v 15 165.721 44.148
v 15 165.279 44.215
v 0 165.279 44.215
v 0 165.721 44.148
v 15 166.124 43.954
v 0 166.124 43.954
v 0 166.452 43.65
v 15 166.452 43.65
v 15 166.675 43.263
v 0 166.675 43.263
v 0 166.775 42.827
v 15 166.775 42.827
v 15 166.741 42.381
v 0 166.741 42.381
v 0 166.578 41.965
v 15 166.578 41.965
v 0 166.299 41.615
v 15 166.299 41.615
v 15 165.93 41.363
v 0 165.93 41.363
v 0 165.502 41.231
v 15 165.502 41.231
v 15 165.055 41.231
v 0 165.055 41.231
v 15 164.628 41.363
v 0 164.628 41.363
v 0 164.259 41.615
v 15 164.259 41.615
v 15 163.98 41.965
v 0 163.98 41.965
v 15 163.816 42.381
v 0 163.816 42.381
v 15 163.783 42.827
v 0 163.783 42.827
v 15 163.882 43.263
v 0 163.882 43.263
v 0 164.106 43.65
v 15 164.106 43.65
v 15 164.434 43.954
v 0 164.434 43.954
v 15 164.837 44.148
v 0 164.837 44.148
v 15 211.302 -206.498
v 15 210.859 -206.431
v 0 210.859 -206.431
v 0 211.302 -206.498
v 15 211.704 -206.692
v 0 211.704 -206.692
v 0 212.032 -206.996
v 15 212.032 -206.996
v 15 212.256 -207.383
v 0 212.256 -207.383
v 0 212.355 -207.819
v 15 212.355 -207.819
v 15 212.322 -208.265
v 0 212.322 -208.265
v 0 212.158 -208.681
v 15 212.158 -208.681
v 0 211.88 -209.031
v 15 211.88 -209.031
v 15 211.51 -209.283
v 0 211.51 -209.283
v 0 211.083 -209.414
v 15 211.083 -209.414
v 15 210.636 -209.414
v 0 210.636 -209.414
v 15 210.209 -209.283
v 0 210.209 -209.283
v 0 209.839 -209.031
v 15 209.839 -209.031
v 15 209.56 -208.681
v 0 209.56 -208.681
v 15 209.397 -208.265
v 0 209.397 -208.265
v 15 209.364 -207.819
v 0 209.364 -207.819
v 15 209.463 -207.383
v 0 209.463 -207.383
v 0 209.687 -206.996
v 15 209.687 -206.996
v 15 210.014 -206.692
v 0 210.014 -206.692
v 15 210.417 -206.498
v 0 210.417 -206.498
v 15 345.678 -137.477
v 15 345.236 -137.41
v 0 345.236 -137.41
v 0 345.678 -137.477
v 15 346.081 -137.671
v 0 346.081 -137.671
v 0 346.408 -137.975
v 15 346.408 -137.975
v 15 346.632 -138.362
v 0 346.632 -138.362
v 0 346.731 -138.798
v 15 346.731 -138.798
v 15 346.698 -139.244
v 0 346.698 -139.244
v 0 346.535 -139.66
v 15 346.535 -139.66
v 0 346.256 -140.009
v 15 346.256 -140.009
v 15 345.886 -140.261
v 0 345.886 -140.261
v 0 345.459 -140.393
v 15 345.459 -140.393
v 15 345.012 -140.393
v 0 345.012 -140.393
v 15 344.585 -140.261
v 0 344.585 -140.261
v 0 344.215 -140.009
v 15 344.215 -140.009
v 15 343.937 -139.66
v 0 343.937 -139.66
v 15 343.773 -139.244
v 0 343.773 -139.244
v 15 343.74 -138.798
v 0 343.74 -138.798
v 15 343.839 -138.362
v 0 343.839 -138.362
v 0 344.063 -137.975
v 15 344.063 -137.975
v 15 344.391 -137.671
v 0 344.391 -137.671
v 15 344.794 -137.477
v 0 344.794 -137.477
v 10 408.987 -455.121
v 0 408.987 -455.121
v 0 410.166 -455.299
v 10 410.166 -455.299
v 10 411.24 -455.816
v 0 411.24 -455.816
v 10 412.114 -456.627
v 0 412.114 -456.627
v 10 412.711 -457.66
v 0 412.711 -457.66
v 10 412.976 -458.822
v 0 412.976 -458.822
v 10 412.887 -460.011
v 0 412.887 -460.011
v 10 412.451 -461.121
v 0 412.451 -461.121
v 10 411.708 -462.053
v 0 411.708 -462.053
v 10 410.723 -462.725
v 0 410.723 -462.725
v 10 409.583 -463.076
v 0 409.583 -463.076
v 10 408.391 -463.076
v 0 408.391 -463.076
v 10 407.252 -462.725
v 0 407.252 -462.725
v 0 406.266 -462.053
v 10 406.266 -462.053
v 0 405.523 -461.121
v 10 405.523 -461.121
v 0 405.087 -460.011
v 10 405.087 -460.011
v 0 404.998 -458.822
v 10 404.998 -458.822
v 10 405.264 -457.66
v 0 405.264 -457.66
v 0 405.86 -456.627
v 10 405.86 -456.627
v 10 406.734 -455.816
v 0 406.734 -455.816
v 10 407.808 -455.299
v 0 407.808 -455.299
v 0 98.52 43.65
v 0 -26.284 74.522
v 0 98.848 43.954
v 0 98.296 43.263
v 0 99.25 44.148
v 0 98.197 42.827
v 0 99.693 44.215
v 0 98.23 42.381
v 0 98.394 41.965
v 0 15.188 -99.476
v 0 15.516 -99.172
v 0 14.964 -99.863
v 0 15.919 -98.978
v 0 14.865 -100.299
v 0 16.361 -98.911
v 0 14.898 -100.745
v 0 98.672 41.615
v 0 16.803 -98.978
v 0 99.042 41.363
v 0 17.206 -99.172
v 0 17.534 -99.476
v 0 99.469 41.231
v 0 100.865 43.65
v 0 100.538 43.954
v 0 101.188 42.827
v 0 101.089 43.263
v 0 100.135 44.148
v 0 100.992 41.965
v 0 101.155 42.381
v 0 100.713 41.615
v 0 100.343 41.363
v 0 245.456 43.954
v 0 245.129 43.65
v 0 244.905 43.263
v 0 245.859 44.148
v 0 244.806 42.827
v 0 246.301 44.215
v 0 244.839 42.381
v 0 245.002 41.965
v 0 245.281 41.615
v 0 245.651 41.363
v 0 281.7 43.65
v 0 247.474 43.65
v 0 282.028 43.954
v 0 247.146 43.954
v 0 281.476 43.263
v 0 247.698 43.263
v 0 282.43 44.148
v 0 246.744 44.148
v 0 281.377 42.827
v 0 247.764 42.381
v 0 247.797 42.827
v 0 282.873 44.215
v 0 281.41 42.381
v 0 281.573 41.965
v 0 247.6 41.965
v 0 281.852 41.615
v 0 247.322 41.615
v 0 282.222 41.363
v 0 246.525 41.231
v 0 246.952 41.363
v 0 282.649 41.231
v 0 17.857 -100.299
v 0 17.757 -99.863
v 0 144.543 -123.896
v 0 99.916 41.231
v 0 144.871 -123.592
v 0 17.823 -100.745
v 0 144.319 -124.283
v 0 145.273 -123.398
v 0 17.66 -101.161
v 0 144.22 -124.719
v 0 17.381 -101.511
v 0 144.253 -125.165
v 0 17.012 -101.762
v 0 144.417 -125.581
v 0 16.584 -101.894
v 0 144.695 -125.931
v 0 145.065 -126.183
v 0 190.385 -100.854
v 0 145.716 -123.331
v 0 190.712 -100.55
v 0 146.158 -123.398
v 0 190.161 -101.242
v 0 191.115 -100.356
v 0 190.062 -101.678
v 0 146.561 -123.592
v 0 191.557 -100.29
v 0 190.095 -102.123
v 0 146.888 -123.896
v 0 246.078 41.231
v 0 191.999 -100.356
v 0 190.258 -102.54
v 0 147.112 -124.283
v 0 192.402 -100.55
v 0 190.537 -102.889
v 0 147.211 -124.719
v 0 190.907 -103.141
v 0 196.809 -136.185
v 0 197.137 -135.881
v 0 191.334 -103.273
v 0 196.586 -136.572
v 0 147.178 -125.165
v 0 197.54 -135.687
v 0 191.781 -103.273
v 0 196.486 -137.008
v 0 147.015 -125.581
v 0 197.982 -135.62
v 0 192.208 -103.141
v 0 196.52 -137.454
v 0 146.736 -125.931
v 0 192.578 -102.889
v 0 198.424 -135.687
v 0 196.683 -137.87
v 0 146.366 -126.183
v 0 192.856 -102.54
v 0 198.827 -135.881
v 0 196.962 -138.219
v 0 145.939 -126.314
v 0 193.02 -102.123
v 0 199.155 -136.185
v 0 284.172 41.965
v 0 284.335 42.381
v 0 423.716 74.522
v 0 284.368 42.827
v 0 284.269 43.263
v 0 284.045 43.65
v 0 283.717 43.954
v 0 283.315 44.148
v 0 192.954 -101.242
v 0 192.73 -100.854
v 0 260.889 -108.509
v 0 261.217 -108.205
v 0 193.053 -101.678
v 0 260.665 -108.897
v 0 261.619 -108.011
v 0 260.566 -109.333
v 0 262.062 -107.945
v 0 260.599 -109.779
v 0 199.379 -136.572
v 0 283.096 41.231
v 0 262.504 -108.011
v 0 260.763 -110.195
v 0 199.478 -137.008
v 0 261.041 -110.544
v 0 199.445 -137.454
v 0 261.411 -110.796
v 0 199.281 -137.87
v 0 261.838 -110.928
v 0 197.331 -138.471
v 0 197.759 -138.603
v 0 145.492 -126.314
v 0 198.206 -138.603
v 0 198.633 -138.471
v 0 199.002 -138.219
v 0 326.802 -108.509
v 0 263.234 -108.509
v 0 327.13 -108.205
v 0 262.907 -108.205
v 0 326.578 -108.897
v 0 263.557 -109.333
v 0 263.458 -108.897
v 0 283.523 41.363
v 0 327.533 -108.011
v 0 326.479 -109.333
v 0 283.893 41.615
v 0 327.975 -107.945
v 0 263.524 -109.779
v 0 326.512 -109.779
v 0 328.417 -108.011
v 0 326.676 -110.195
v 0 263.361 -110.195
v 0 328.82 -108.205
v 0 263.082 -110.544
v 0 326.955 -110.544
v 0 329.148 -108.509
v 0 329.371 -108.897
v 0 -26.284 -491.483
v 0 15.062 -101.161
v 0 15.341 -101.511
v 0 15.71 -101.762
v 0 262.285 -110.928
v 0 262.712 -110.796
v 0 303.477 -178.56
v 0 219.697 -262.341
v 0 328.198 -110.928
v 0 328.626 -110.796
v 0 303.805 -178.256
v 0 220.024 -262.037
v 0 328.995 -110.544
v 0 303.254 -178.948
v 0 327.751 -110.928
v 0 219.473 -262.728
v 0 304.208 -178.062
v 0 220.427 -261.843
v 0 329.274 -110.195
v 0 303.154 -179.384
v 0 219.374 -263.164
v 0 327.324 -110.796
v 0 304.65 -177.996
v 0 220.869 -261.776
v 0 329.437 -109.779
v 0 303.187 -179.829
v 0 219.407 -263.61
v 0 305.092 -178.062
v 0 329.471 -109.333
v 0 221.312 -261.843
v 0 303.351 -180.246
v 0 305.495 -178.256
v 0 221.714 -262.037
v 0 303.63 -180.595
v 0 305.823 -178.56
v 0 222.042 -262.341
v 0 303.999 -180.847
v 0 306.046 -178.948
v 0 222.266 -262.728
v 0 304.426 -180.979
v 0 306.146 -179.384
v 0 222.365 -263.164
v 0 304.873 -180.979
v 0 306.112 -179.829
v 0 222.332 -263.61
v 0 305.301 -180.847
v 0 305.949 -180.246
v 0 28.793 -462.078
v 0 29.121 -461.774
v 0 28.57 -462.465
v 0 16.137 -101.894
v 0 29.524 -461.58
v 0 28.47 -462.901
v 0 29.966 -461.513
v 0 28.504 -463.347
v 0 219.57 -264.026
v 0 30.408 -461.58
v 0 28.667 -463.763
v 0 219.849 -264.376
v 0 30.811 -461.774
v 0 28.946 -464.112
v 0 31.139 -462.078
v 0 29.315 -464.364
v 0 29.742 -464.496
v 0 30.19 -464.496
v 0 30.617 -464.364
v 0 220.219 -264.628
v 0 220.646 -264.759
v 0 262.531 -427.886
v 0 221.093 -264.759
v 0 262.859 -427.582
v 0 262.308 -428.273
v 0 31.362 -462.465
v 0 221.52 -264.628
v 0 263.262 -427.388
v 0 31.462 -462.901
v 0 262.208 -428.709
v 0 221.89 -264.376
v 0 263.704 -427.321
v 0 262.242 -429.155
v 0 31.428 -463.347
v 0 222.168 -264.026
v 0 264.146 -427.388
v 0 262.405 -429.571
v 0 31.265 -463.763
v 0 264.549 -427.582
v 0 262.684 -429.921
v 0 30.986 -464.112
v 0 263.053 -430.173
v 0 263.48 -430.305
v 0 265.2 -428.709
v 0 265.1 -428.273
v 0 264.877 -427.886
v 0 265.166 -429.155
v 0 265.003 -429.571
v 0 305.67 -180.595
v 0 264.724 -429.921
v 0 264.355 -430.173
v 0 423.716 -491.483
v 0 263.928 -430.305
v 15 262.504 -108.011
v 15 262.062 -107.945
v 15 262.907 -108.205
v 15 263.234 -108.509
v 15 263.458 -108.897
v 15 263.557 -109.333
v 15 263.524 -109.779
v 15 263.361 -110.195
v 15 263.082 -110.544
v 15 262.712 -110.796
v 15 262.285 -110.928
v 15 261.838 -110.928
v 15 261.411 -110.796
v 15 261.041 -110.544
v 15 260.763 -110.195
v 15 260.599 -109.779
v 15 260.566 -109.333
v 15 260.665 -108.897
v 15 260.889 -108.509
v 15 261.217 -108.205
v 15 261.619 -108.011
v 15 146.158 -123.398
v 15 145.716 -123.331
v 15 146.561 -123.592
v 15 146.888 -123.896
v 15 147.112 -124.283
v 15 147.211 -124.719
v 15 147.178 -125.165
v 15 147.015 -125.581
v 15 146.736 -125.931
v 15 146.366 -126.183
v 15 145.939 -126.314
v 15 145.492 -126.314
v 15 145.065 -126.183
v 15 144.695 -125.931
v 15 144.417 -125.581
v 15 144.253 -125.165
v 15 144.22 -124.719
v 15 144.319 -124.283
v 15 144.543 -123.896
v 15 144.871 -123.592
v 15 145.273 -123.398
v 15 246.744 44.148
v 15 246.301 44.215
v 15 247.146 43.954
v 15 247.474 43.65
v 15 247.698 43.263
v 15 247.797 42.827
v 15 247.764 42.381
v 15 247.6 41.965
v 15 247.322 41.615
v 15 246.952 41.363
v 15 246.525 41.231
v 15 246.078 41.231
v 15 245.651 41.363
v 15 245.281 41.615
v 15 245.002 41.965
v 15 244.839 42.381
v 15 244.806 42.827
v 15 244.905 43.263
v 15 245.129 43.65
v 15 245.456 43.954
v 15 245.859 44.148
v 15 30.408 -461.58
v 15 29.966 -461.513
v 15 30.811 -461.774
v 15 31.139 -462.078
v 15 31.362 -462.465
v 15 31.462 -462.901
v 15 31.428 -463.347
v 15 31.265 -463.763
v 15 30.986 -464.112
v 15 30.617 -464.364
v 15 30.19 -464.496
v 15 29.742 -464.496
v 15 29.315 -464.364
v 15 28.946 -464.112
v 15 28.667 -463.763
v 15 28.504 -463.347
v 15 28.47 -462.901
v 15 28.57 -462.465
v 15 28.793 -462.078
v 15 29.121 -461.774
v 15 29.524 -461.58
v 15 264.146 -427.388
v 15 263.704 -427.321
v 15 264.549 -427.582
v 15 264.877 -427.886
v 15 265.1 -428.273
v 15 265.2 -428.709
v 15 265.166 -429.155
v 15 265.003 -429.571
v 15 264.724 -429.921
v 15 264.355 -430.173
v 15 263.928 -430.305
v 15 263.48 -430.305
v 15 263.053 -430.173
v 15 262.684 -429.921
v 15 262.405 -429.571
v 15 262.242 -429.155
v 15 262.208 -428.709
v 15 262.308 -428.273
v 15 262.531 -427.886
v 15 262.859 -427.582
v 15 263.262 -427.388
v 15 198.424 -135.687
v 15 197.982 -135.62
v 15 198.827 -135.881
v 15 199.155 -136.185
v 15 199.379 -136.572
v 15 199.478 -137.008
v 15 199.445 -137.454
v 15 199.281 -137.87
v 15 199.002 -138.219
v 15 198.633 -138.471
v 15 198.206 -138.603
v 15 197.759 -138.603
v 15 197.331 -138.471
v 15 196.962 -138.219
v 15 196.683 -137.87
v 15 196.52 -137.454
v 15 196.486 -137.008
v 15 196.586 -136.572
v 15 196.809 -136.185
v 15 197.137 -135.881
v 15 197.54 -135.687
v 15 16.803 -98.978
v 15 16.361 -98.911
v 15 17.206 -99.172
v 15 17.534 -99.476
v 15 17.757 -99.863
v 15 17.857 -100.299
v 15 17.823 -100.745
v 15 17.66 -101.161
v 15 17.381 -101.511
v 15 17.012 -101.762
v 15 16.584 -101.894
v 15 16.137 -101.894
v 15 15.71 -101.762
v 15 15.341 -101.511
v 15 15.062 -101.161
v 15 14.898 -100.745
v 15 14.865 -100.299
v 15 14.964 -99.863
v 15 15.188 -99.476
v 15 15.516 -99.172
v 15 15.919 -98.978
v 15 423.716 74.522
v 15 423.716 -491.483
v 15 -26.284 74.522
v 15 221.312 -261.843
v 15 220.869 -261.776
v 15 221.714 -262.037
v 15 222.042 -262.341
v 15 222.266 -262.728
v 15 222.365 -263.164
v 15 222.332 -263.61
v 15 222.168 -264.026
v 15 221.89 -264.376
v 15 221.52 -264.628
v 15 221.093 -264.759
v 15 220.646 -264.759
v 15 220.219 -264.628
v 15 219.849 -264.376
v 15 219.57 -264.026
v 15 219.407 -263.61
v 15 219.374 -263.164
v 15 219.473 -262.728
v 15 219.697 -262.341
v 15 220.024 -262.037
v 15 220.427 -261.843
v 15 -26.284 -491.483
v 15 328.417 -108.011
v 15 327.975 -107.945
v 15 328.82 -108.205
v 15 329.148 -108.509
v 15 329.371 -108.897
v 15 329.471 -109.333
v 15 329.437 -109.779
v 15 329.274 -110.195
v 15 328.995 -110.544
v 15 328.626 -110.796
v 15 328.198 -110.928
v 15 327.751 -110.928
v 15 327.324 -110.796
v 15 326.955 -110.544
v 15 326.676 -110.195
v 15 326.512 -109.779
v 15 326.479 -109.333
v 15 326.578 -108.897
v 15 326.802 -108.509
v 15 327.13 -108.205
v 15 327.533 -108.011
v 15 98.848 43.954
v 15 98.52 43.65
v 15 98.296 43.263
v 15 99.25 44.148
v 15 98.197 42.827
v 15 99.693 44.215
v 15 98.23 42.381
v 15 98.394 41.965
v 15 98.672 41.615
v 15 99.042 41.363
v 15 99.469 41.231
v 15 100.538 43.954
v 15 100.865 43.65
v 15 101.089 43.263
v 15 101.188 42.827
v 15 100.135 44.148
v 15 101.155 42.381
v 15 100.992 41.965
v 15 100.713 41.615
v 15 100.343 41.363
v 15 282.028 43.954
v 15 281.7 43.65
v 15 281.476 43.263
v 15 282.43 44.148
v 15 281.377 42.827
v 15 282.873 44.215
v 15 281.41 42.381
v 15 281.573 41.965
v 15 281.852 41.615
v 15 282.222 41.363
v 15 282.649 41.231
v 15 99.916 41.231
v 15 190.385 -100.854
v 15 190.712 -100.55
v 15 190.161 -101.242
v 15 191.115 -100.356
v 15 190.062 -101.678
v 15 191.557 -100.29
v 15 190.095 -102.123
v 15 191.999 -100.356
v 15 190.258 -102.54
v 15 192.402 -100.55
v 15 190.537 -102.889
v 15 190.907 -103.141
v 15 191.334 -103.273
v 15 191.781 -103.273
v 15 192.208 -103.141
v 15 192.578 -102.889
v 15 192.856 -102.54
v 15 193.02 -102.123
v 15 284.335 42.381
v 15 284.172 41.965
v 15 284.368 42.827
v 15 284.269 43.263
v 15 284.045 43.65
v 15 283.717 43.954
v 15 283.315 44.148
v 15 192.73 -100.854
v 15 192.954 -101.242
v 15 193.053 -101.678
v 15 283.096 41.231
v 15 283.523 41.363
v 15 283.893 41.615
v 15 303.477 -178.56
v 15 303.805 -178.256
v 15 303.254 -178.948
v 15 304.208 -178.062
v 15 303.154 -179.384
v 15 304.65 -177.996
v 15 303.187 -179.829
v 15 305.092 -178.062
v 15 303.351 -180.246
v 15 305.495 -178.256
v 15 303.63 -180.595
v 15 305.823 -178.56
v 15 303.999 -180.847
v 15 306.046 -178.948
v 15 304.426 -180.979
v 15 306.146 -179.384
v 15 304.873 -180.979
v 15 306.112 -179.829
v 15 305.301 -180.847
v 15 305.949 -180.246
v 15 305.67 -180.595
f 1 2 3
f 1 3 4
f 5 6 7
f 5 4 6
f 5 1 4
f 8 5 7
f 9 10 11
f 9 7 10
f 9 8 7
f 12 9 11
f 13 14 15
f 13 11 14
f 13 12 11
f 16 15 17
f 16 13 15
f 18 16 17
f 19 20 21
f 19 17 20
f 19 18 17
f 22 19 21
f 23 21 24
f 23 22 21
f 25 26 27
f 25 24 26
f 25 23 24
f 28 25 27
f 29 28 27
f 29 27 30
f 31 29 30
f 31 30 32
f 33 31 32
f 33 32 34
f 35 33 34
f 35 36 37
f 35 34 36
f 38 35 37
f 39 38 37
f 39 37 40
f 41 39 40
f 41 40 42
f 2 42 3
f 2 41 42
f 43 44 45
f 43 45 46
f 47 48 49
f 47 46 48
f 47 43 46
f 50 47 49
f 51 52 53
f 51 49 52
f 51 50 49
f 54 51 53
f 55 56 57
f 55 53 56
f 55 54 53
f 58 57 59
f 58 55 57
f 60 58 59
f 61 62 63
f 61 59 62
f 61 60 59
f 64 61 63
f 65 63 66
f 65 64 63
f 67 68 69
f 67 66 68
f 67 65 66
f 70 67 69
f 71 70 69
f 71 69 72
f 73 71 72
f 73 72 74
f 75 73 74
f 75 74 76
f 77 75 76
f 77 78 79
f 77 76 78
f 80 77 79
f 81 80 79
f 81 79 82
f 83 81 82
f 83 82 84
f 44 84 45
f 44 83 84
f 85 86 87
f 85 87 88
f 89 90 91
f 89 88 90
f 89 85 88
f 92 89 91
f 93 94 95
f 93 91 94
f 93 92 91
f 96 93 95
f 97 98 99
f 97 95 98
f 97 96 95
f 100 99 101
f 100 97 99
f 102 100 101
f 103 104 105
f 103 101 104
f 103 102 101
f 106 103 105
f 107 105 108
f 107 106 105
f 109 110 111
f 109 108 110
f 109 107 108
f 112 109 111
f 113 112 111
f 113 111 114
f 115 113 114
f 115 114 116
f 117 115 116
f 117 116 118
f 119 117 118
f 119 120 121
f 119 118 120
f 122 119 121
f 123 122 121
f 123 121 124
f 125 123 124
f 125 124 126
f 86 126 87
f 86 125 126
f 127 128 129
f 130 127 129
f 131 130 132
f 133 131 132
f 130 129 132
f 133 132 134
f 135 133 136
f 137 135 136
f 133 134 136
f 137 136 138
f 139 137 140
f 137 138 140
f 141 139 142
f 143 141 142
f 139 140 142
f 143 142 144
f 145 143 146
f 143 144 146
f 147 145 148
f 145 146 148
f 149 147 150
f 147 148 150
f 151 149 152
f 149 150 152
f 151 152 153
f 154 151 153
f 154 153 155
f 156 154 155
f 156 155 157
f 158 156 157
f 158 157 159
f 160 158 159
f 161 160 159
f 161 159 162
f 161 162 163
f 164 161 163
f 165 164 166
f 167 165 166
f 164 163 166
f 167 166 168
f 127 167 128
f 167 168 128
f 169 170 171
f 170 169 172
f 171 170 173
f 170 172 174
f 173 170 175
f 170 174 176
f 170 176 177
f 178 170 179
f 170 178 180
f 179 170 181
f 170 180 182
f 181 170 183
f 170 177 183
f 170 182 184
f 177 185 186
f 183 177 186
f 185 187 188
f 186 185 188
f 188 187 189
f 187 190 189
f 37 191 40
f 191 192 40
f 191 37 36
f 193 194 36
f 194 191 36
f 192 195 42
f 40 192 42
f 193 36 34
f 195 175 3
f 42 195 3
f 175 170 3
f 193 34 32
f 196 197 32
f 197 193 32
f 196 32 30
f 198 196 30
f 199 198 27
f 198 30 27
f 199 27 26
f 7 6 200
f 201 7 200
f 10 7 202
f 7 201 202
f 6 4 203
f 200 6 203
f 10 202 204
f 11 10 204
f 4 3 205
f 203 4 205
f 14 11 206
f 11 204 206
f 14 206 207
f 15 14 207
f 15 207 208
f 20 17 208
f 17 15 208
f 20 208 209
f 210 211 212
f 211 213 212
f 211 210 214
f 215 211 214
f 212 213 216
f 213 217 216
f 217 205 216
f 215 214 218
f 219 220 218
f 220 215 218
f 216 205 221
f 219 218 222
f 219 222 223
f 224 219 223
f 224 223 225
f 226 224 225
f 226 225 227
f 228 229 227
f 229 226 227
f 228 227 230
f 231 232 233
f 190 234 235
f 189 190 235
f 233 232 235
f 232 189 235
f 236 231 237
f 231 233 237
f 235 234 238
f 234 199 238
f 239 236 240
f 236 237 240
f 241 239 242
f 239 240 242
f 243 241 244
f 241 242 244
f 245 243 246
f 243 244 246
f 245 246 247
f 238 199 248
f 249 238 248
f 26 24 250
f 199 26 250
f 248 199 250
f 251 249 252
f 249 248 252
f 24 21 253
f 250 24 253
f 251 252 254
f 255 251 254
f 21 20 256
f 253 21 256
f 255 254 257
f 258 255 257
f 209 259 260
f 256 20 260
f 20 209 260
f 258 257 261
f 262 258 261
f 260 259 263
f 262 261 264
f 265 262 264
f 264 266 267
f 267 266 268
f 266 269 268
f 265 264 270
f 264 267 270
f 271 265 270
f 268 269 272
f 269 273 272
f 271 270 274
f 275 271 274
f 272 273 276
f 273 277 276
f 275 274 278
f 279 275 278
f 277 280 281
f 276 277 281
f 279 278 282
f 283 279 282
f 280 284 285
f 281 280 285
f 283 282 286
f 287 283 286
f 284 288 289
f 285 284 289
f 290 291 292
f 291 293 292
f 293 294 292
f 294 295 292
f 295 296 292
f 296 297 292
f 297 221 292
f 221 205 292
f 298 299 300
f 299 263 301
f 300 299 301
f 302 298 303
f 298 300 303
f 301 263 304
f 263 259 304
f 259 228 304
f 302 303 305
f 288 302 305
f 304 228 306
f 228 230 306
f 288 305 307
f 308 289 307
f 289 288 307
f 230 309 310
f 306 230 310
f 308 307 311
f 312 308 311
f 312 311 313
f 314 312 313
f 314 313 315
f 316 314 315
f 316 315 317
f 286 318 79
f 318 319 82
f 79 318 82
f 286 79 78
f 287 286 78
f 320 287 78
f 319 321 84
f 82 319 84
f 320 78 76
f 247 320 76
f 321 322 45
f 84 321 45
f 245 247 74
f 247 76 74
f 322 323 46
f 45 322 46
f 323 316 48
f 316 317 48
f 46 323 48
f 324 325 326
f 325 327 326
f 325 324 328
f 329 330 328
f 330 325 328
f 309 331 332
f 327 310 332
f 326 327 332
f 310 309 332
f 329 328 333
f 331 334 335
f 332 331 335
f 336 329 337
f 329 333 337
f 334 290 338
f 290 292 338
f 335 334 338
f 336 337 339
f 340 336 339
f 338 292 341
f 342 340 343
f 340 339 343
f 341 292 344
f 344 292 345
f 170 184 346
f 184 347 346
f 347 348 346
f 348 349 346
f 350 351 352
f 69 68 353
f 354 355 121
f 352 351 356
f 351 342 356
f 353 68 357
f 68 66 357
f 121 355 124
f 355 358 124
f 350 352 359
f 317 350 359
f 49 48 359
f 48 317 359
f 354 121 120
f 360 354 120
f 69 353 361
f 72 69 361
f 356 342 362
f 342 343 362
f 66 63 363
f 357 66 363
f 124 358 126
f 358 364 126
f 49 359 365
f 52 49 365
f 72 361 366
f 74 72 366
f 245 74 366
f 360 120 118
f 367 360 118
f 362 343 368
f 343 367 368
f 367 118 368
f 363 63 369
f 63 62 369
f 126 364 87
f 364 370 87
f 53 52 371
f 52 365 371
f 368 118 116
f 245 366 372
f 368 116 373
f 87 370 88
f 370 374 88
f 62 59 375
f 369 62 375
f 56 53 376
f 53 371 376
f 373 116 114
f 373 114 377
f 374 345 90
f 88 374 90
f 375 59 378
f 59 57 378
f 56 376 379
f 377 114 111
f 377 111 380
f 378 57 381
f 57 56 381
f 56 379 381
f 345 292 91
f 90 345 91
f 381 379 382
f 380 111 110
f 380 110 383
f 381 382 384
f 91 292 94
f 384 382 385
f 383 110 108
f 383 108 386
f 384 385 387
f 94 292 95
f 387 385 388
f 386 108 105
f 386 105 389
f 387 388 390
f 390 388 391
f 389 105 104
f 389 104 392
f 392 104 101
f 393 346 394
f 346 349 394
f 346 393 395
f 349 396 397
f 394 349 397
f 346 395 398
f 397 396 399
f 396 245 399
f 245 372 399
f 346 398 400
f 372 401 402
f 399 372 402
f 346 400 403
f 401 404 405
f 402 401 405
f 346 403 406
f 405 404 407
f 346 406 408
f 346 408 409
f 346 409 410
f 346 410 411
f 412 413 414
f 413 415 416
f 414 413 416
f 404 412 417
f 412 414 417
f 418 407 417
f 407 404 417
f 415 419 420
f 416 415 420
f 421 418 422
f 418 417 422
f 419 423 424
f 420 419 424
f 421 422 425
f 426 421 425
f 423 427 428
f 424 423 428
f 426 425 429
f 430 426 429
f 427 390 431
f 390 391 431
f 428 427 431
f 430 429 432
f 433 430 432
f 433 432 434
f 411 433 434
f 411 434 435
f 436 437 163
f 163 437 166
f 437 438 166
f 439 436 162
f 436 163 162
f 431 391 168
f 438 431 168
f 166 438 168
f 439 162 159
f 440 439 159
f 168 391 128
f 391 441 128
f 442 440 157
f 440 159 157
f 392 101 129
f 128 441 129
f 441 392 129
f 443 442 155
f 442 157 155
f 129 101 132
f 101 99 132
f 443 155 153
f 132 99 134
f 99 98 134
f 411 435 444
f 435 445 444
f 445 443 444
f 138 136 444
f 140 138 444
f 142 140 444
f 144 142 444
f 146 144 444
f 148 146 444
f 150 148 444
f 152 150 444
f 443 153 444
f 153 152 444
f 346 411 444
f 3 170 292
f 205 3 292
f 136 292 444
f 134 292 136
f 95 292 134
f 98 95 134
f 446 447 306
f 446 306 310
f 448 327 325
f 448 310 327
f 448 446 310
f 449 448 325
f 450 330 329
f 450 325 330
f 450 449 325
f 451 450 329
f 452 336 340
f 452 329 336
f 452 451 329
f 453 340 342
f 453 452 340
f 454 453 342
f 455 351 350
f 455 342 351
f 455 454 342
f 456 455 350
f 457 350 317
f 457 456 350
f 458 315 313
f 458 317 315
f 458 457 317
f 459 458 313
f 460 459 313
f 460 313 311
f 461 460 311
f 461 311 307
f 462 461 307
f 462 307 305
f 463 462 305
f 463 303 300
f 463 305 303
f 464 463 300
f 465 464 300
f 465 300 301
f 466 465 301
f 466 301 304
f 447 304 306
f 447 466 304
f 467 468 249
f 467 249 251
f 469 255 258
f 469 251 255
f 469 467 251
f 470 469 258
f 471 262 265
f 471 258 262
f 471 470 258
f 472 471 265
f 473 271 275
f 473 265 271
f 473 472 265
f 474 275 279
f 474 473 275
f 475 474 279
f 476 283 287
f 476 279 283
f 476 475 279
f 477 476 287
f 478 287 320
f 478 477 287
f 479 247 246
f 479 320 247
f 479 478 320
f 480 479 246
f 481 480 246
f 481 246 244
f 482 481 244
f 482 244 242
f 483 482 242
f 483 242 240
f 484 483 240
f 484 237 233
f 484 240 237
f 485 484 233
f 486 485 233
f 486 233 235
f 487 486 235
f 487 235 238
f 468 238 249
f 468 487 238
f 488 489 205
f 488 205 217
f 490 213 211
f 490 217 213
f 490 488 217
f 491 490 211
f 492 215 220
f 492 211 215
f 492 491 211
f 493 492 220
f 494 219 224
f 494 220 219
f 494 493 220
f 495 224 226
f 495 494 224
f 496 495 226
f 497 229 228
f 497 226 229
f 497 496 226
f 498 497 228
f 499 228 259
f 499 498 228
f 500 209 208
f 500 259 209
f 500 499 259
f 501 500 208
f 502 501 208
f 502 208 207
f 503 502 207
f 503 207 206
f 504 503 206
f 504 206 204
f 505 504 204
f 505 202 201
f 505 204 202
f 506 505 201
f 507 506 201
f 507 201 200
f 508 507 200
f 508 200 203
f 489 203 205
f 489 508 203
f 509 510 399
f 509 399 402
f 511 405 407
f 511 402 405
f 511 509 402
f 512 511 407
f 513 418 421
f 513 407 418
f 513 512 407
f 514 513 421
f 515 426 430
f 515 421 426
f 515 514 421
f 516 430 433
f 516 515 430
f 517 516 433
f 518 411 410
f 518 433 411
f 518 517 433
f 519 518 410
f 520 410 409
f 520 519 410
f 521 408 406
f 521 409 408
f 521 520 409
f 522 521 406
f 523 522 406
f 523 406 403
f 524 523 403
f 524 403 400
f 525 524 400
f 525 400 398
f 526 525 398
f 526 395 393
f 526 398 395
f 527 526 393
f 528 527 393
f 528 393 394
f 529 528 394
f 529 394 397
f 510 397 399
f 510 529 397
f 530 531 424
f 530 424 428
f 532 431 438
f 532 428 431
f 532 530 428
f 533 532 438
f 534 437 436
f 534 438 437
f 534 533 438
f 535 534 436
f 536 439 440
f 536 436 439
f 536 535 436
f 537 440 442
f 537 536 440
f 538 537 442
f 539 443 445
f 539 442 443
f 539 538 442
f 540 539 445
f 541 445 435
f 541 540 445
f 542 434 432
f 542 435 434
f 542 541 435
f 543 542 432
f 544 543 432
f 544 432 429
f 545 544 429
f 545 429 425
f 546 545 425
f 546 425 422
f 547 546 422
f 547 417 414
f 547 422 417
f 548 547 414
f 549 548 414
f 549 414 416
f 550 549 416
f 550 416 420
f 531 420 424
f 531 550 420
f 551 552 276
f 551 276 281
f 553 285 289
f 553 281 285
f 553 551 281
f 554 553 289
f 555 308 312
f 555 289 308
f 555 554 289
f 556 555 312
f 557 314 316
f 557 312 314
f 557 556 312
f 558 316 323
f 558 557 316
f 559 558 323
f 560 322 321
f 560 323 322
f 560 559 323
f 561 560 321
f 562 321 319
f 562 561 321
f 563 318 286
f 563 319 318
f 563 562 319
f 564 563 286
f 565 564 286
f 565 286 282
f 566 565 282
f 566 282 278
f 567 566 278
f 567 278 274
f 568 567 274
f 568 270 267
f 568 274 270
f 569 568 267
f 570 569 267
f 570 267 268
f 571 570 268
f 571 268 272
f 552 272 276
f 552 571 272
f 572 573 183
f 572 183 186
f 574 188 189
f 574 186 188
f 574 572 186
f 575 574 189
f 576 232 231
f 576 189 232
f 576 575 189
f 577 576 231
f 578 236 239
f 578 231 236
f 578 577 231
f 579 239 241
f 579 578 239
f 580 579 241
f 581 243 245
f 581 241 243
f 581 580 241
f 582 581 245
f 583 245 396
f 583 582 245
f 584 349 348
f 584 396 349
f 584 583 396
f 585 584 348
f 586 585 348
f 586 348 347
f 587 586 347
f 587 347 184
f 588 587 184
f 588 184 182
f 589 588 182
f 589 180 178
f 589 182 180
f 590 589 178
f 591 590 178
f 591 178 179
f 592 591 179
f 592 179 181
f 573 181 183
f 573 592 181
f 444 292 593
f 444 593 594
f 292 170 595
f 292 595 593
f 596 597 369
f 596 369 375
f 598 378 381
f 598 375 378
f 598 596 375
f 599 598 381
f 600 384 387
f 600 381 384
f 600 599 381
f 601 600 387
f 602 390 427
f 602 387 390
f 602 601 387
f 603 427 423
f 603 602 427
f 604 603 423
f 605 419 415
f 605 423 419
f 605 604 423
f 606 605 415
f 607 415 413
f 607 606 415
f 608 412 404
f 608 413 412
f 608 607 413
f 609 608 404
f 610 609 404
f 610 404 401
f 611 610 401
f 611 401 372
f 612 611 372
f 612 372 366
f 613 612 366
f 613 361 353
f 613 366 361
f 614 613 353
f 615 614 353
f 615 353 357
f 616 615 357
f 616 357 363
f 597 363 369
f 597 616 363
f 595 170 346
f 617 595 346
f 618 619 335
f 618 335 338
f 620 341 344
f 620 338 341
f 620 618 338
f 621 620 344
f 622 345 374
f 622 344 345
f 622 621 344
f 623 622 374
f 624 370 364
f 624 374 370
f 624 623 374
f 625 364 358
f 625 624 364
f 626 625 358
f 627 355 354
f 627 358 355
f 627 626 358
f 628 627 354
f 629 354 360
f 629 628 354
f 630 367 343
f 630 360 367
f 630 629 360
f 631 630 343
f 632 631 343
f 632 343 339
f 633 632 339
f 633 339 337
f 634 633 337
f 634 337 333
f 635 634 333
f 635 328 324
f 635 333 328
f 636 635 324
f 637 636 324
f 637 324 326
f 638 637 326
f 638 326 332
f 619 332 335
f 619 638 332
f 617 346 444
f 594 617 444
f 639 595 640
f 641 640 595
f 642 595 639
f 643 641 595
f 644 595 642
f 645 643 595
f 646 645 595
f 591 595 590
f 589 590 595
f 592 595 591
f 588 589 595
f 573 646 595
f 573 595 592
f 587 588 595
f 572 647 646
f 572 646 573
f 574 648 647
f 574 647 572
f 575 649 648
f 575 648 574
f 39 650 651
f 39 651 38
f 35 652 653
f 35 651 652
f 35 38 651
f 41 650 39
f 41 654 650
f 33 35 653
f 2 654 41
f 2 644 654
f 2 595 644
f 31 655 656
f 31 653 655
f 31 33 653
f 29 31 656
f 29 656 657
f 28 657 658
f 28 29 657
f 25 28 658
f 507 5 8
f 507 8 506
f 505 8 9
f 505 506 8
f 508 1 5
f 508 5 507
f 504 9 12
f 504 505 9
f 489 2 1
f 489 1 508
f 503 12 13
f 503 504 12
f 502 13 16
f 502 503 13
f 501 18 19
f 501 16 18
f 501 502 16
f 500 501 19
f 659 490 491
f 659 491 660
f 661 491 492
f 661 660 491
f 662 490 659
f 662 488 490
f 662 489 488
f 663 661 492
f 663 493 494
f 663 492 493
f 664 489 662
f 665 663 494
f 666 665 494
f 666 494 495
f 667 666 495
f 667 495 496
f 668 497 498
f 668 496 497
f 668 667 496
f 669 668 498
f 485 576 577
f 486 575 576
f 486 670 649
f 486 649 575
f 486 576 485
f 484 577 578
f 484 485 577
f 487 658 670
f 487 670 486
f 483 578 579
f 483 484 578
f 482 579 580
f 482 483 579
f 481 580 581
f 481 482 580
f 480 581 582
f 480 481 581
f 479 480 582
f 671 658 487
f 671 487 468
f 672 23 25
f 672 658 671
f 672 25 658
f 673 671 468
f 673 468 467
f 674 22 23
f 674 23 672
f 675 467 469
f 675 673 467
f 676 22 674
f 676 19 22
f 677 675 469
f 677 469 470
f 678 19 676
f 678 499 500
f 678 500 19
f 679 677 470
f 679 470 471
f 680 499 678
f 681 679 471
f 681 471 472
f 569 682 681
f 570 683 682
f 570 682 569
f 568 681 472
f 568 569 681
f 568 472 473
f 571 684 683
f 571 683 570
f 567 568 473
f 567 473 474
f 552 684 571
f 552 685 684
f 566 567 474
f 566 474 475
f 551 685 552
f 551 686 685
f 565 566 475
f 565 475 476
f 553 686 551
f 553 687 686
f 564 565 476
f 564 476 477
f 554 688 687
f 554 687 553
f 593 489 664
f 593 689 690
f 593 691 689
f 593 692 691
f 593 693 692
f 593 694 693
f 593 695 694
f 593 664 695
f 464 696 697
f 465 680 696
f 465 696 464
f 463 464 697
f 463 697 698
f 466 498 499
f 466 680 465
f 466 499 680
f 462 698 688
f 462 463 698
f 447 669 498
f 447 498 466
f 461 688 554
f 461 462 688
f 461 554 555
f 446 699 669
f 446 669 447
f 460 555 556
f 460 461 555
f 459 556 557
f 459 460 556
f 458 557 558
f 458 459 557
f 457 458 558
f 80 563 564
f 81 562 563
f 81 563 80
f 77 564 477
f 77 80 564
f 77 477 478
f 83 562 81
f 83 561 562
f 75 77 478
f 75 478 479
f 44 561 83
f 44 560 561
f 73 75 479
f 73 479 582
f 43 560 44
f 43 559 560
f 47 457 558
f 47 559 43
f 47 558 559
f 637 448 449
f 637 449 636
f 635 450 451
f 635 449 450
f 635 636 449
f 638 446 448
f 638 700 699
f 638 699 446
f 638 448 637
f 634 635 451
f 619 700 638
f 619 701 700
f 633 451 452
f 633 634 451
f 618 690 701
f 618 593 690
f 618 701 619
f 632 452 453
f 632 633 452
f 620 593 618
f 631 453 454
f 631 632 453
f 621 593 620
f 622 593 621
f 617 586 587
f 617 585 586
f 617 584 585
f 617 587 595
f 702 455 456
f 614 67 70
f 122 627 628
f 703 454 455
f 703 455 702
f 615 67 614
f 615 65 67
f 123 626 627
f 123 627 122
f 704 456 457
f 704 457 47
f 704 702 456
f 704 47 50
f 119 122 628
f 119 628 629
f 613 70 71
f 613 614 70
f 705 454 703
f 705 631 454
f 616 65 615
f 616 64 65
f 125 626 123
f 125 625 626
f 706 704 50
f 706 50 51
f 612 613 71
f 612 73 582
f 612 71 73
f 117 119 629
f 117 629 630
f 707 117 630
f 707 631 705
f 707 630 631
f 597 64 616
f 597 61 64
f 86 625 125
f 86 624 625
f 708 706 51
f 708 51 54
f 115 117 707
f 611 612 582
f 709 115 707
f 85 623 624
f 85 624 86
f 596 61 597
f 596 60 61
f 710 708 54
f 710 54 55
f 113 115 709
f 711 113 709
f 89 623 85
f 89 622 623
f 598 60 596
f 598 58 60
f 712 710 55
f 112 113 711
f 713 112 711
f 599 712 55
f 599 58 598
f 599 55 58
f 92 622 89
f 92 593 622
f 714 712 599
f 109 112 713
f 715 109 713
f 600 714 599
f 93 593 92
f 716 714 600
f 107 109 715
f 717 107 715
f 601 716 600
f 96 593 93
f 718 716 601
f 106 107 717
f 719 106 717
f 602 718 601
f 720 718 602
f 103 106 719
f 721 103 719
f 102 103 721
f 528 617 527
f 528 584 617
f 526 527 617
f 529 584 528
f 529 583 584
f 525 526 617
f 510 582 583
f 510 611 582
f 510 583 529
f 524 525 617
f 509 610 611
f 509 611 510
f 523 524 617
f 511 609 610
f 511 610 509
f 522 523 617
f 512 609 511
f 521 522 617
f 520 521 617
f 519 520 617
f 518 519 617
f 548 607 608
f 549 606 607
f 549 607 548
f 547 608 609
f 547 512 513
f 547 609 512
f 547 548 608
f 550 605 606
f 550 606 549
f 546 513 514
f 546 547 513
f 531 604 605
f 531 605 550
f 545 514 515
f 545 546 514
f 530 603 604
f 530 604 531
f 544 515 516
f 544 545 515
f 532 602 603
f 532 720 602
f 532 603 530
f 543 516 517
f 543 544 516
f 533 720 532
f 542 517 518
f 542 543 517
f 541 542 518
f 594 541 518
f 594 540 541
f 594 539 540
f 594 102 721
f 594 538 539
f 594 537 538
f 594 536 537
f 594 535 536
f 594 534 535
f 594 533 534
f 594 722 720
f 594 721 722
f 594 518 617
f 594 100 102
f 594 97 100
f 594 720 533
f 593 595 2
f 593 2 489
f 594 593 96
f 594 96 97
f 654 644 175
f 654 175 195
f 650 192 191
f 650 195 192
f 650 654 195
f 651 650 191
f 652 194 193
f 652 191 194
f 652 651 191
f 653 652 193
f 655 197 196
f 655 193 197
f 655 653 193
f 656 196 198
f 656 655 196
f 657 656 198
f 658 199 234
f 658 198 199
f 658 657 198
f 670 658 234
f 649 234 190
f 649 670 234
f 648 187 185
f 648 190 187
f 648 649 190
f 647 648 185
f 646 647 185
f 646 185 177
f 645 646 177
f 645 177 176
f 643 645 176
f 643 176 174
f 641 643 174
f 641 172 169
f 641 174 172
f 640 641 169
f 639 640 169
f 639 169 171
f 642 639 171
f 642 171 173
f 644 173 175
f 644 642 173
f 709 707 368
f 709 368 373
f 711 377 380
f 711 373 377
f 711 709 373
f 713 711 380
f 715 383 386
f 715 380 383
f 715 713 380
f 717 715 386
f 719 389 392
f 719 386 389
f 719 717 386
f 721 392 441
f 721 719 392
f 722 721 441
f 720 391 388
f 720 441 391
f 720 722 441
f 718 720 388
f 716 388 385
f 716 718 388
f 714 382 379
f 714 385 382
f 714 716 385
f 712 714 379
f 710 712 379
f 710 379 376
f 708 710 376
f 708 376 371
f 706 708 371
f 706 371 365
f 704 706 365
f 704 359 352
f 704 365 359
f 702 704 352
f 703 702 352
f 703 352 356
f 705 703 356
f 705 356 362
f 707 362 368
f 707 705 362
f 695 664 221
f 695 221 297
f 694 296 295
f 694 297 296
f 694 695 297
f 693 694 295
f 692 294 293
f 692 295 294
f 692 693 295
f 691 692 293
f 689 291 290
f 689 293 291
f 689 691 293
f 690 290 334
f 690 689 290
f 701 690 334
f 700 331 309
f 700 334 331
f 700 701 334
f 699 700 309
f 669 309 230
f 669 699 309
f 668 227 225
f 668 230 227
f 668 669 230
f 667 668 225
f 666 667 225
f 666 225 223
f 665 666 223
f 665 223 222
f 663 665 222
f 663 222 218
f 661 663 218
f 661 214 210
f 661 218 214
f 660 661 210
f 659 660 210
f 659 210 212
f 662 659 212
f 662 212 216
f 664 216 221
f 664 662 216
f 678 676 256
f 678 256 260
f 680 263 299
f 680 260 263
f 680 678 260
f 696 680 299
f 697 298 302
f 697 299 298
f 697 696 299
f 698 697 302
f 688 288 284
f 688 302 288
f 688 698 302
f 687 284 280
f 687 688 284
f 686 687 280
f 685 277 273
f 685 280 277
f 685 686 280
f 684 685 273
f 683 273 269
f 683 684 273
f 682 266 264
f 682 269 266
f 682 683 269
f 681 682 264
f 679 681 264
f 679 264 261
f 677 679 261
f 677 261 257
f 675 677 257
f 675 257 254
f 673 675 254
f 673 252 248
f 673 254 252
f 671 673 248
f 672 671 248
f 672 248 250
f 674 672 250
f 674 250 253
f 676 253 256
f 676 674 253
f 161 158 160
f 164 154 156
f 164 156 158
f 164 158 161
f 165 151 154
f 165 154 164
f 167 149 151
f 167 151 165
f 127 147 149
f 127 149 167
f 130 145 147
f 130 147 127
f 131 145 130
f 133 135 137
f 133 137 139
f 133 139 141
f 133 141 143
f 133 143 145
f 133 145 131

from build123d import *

# Parameters (mm, degrees)
SKETCH_1_W               = 566.00530096
SKETCH_1_H               = 450
EXTRUDE_1_DEPTH          = 15
SKETCH_3_R               = 4
CUT_EXTRUDE_1_DEPTH      = 10
CUT_EXTRUDE_2_DEPTH      = 650.088721912
CUT_EXTRUDE_2_DEPTH_BACK = 650.088721912
SKETCH_4_R               = 1.5


with BuildPart() as part:
    # Эскиз1 → Бобышка-Вытянуть1 (new body)
    with BuildSketch(Plane(origin=(0, 0, 0), x_dir=(0, 0, -1), z_dir=(1, 0, 0))):
        with Locations((208.480579539, 198.716182749)):
            Rectangle(SKETCH_1_W, SKETCH_1_H)
    extrude(amount=EXTRUDE_1_DEPTH)

    # Эскиз3 → Вырез-Вытянуть1 (cut)
    with BuildSketch(Plane.ZY):
        with Locations((-459.121136887, 408.987044781)):
            Circle(SKETCH_3_R)
    extrude(amount=-CUT_EXTRUDE_1_DEPTH, mode=Mode.SUBTRACT)

    # Эскиз4 → Вырез-Вытянуть2 (cut, two sides: drawn at the far end of the back side and taken through both)
    with BuildSketch(Plane.ZY.offset(-CUT_EXTRUDE_2_DEPTH_BACK)):
        with Locations((-138.909883055, 345.235633328)):
            Circle(SKETCH_4_R)
        with Locations((-179.495629652, 304.64988673)):
            Circle(SKETCH_4_R)
        with Locations((-263.2761242, 220.869392183)):
            Circle(SKETCH_4_R)
        with Locations((-207.931126478, 210.859443585)):
            Circle(SKETCH_4_R)
        with Locations((-137.119879485, 197.982216734)):
            Circle(SKETCH_4_R)
        with Locations((42.714652053, 165.278795224)):
            Circle(SKETCH_4_R)
        with Locations((-124.831154964, 145.715565594)):
            Circle(SKETCH_4_R)
        with Locations((42.714652053, 99.692621204)):
            Circle(SKETCH_4_R)
        with Locations((-100.410954005, 16.360792756)):
            Circle(SKETCH_4_R)
        with Locations((-101.789718427, 191.557326369)):
            Circle(SKETCH_4_R)
        with Locations((42.714652053, 246.301380308)):
            Circle(SKETCH_4_R)
        with Locations((-428.821301923, 263.704028896)):
            Circle(SKETCH_4_R)
        with Locations((42.714652053, 282.872517245)):
            Circle(SKETCH_4_R)
        with Locations((-109.444727657, 262.061630053)):
            Circle(SKETCH_4_R)
        with Locations((-109.444727657, 327.974766948)):
            Circle(SKETCH_4_R)
        with Locations((-463.012887704, 29.966051081)):
            Circle(SKETCH_4_R)
    extrude(amount=CUT_EXTRUDE_2_DEPTH + CUT_EXTRUDE_2_DEPTH_BACK, mode=Mode.SUBTRACT)


solid = part.part
